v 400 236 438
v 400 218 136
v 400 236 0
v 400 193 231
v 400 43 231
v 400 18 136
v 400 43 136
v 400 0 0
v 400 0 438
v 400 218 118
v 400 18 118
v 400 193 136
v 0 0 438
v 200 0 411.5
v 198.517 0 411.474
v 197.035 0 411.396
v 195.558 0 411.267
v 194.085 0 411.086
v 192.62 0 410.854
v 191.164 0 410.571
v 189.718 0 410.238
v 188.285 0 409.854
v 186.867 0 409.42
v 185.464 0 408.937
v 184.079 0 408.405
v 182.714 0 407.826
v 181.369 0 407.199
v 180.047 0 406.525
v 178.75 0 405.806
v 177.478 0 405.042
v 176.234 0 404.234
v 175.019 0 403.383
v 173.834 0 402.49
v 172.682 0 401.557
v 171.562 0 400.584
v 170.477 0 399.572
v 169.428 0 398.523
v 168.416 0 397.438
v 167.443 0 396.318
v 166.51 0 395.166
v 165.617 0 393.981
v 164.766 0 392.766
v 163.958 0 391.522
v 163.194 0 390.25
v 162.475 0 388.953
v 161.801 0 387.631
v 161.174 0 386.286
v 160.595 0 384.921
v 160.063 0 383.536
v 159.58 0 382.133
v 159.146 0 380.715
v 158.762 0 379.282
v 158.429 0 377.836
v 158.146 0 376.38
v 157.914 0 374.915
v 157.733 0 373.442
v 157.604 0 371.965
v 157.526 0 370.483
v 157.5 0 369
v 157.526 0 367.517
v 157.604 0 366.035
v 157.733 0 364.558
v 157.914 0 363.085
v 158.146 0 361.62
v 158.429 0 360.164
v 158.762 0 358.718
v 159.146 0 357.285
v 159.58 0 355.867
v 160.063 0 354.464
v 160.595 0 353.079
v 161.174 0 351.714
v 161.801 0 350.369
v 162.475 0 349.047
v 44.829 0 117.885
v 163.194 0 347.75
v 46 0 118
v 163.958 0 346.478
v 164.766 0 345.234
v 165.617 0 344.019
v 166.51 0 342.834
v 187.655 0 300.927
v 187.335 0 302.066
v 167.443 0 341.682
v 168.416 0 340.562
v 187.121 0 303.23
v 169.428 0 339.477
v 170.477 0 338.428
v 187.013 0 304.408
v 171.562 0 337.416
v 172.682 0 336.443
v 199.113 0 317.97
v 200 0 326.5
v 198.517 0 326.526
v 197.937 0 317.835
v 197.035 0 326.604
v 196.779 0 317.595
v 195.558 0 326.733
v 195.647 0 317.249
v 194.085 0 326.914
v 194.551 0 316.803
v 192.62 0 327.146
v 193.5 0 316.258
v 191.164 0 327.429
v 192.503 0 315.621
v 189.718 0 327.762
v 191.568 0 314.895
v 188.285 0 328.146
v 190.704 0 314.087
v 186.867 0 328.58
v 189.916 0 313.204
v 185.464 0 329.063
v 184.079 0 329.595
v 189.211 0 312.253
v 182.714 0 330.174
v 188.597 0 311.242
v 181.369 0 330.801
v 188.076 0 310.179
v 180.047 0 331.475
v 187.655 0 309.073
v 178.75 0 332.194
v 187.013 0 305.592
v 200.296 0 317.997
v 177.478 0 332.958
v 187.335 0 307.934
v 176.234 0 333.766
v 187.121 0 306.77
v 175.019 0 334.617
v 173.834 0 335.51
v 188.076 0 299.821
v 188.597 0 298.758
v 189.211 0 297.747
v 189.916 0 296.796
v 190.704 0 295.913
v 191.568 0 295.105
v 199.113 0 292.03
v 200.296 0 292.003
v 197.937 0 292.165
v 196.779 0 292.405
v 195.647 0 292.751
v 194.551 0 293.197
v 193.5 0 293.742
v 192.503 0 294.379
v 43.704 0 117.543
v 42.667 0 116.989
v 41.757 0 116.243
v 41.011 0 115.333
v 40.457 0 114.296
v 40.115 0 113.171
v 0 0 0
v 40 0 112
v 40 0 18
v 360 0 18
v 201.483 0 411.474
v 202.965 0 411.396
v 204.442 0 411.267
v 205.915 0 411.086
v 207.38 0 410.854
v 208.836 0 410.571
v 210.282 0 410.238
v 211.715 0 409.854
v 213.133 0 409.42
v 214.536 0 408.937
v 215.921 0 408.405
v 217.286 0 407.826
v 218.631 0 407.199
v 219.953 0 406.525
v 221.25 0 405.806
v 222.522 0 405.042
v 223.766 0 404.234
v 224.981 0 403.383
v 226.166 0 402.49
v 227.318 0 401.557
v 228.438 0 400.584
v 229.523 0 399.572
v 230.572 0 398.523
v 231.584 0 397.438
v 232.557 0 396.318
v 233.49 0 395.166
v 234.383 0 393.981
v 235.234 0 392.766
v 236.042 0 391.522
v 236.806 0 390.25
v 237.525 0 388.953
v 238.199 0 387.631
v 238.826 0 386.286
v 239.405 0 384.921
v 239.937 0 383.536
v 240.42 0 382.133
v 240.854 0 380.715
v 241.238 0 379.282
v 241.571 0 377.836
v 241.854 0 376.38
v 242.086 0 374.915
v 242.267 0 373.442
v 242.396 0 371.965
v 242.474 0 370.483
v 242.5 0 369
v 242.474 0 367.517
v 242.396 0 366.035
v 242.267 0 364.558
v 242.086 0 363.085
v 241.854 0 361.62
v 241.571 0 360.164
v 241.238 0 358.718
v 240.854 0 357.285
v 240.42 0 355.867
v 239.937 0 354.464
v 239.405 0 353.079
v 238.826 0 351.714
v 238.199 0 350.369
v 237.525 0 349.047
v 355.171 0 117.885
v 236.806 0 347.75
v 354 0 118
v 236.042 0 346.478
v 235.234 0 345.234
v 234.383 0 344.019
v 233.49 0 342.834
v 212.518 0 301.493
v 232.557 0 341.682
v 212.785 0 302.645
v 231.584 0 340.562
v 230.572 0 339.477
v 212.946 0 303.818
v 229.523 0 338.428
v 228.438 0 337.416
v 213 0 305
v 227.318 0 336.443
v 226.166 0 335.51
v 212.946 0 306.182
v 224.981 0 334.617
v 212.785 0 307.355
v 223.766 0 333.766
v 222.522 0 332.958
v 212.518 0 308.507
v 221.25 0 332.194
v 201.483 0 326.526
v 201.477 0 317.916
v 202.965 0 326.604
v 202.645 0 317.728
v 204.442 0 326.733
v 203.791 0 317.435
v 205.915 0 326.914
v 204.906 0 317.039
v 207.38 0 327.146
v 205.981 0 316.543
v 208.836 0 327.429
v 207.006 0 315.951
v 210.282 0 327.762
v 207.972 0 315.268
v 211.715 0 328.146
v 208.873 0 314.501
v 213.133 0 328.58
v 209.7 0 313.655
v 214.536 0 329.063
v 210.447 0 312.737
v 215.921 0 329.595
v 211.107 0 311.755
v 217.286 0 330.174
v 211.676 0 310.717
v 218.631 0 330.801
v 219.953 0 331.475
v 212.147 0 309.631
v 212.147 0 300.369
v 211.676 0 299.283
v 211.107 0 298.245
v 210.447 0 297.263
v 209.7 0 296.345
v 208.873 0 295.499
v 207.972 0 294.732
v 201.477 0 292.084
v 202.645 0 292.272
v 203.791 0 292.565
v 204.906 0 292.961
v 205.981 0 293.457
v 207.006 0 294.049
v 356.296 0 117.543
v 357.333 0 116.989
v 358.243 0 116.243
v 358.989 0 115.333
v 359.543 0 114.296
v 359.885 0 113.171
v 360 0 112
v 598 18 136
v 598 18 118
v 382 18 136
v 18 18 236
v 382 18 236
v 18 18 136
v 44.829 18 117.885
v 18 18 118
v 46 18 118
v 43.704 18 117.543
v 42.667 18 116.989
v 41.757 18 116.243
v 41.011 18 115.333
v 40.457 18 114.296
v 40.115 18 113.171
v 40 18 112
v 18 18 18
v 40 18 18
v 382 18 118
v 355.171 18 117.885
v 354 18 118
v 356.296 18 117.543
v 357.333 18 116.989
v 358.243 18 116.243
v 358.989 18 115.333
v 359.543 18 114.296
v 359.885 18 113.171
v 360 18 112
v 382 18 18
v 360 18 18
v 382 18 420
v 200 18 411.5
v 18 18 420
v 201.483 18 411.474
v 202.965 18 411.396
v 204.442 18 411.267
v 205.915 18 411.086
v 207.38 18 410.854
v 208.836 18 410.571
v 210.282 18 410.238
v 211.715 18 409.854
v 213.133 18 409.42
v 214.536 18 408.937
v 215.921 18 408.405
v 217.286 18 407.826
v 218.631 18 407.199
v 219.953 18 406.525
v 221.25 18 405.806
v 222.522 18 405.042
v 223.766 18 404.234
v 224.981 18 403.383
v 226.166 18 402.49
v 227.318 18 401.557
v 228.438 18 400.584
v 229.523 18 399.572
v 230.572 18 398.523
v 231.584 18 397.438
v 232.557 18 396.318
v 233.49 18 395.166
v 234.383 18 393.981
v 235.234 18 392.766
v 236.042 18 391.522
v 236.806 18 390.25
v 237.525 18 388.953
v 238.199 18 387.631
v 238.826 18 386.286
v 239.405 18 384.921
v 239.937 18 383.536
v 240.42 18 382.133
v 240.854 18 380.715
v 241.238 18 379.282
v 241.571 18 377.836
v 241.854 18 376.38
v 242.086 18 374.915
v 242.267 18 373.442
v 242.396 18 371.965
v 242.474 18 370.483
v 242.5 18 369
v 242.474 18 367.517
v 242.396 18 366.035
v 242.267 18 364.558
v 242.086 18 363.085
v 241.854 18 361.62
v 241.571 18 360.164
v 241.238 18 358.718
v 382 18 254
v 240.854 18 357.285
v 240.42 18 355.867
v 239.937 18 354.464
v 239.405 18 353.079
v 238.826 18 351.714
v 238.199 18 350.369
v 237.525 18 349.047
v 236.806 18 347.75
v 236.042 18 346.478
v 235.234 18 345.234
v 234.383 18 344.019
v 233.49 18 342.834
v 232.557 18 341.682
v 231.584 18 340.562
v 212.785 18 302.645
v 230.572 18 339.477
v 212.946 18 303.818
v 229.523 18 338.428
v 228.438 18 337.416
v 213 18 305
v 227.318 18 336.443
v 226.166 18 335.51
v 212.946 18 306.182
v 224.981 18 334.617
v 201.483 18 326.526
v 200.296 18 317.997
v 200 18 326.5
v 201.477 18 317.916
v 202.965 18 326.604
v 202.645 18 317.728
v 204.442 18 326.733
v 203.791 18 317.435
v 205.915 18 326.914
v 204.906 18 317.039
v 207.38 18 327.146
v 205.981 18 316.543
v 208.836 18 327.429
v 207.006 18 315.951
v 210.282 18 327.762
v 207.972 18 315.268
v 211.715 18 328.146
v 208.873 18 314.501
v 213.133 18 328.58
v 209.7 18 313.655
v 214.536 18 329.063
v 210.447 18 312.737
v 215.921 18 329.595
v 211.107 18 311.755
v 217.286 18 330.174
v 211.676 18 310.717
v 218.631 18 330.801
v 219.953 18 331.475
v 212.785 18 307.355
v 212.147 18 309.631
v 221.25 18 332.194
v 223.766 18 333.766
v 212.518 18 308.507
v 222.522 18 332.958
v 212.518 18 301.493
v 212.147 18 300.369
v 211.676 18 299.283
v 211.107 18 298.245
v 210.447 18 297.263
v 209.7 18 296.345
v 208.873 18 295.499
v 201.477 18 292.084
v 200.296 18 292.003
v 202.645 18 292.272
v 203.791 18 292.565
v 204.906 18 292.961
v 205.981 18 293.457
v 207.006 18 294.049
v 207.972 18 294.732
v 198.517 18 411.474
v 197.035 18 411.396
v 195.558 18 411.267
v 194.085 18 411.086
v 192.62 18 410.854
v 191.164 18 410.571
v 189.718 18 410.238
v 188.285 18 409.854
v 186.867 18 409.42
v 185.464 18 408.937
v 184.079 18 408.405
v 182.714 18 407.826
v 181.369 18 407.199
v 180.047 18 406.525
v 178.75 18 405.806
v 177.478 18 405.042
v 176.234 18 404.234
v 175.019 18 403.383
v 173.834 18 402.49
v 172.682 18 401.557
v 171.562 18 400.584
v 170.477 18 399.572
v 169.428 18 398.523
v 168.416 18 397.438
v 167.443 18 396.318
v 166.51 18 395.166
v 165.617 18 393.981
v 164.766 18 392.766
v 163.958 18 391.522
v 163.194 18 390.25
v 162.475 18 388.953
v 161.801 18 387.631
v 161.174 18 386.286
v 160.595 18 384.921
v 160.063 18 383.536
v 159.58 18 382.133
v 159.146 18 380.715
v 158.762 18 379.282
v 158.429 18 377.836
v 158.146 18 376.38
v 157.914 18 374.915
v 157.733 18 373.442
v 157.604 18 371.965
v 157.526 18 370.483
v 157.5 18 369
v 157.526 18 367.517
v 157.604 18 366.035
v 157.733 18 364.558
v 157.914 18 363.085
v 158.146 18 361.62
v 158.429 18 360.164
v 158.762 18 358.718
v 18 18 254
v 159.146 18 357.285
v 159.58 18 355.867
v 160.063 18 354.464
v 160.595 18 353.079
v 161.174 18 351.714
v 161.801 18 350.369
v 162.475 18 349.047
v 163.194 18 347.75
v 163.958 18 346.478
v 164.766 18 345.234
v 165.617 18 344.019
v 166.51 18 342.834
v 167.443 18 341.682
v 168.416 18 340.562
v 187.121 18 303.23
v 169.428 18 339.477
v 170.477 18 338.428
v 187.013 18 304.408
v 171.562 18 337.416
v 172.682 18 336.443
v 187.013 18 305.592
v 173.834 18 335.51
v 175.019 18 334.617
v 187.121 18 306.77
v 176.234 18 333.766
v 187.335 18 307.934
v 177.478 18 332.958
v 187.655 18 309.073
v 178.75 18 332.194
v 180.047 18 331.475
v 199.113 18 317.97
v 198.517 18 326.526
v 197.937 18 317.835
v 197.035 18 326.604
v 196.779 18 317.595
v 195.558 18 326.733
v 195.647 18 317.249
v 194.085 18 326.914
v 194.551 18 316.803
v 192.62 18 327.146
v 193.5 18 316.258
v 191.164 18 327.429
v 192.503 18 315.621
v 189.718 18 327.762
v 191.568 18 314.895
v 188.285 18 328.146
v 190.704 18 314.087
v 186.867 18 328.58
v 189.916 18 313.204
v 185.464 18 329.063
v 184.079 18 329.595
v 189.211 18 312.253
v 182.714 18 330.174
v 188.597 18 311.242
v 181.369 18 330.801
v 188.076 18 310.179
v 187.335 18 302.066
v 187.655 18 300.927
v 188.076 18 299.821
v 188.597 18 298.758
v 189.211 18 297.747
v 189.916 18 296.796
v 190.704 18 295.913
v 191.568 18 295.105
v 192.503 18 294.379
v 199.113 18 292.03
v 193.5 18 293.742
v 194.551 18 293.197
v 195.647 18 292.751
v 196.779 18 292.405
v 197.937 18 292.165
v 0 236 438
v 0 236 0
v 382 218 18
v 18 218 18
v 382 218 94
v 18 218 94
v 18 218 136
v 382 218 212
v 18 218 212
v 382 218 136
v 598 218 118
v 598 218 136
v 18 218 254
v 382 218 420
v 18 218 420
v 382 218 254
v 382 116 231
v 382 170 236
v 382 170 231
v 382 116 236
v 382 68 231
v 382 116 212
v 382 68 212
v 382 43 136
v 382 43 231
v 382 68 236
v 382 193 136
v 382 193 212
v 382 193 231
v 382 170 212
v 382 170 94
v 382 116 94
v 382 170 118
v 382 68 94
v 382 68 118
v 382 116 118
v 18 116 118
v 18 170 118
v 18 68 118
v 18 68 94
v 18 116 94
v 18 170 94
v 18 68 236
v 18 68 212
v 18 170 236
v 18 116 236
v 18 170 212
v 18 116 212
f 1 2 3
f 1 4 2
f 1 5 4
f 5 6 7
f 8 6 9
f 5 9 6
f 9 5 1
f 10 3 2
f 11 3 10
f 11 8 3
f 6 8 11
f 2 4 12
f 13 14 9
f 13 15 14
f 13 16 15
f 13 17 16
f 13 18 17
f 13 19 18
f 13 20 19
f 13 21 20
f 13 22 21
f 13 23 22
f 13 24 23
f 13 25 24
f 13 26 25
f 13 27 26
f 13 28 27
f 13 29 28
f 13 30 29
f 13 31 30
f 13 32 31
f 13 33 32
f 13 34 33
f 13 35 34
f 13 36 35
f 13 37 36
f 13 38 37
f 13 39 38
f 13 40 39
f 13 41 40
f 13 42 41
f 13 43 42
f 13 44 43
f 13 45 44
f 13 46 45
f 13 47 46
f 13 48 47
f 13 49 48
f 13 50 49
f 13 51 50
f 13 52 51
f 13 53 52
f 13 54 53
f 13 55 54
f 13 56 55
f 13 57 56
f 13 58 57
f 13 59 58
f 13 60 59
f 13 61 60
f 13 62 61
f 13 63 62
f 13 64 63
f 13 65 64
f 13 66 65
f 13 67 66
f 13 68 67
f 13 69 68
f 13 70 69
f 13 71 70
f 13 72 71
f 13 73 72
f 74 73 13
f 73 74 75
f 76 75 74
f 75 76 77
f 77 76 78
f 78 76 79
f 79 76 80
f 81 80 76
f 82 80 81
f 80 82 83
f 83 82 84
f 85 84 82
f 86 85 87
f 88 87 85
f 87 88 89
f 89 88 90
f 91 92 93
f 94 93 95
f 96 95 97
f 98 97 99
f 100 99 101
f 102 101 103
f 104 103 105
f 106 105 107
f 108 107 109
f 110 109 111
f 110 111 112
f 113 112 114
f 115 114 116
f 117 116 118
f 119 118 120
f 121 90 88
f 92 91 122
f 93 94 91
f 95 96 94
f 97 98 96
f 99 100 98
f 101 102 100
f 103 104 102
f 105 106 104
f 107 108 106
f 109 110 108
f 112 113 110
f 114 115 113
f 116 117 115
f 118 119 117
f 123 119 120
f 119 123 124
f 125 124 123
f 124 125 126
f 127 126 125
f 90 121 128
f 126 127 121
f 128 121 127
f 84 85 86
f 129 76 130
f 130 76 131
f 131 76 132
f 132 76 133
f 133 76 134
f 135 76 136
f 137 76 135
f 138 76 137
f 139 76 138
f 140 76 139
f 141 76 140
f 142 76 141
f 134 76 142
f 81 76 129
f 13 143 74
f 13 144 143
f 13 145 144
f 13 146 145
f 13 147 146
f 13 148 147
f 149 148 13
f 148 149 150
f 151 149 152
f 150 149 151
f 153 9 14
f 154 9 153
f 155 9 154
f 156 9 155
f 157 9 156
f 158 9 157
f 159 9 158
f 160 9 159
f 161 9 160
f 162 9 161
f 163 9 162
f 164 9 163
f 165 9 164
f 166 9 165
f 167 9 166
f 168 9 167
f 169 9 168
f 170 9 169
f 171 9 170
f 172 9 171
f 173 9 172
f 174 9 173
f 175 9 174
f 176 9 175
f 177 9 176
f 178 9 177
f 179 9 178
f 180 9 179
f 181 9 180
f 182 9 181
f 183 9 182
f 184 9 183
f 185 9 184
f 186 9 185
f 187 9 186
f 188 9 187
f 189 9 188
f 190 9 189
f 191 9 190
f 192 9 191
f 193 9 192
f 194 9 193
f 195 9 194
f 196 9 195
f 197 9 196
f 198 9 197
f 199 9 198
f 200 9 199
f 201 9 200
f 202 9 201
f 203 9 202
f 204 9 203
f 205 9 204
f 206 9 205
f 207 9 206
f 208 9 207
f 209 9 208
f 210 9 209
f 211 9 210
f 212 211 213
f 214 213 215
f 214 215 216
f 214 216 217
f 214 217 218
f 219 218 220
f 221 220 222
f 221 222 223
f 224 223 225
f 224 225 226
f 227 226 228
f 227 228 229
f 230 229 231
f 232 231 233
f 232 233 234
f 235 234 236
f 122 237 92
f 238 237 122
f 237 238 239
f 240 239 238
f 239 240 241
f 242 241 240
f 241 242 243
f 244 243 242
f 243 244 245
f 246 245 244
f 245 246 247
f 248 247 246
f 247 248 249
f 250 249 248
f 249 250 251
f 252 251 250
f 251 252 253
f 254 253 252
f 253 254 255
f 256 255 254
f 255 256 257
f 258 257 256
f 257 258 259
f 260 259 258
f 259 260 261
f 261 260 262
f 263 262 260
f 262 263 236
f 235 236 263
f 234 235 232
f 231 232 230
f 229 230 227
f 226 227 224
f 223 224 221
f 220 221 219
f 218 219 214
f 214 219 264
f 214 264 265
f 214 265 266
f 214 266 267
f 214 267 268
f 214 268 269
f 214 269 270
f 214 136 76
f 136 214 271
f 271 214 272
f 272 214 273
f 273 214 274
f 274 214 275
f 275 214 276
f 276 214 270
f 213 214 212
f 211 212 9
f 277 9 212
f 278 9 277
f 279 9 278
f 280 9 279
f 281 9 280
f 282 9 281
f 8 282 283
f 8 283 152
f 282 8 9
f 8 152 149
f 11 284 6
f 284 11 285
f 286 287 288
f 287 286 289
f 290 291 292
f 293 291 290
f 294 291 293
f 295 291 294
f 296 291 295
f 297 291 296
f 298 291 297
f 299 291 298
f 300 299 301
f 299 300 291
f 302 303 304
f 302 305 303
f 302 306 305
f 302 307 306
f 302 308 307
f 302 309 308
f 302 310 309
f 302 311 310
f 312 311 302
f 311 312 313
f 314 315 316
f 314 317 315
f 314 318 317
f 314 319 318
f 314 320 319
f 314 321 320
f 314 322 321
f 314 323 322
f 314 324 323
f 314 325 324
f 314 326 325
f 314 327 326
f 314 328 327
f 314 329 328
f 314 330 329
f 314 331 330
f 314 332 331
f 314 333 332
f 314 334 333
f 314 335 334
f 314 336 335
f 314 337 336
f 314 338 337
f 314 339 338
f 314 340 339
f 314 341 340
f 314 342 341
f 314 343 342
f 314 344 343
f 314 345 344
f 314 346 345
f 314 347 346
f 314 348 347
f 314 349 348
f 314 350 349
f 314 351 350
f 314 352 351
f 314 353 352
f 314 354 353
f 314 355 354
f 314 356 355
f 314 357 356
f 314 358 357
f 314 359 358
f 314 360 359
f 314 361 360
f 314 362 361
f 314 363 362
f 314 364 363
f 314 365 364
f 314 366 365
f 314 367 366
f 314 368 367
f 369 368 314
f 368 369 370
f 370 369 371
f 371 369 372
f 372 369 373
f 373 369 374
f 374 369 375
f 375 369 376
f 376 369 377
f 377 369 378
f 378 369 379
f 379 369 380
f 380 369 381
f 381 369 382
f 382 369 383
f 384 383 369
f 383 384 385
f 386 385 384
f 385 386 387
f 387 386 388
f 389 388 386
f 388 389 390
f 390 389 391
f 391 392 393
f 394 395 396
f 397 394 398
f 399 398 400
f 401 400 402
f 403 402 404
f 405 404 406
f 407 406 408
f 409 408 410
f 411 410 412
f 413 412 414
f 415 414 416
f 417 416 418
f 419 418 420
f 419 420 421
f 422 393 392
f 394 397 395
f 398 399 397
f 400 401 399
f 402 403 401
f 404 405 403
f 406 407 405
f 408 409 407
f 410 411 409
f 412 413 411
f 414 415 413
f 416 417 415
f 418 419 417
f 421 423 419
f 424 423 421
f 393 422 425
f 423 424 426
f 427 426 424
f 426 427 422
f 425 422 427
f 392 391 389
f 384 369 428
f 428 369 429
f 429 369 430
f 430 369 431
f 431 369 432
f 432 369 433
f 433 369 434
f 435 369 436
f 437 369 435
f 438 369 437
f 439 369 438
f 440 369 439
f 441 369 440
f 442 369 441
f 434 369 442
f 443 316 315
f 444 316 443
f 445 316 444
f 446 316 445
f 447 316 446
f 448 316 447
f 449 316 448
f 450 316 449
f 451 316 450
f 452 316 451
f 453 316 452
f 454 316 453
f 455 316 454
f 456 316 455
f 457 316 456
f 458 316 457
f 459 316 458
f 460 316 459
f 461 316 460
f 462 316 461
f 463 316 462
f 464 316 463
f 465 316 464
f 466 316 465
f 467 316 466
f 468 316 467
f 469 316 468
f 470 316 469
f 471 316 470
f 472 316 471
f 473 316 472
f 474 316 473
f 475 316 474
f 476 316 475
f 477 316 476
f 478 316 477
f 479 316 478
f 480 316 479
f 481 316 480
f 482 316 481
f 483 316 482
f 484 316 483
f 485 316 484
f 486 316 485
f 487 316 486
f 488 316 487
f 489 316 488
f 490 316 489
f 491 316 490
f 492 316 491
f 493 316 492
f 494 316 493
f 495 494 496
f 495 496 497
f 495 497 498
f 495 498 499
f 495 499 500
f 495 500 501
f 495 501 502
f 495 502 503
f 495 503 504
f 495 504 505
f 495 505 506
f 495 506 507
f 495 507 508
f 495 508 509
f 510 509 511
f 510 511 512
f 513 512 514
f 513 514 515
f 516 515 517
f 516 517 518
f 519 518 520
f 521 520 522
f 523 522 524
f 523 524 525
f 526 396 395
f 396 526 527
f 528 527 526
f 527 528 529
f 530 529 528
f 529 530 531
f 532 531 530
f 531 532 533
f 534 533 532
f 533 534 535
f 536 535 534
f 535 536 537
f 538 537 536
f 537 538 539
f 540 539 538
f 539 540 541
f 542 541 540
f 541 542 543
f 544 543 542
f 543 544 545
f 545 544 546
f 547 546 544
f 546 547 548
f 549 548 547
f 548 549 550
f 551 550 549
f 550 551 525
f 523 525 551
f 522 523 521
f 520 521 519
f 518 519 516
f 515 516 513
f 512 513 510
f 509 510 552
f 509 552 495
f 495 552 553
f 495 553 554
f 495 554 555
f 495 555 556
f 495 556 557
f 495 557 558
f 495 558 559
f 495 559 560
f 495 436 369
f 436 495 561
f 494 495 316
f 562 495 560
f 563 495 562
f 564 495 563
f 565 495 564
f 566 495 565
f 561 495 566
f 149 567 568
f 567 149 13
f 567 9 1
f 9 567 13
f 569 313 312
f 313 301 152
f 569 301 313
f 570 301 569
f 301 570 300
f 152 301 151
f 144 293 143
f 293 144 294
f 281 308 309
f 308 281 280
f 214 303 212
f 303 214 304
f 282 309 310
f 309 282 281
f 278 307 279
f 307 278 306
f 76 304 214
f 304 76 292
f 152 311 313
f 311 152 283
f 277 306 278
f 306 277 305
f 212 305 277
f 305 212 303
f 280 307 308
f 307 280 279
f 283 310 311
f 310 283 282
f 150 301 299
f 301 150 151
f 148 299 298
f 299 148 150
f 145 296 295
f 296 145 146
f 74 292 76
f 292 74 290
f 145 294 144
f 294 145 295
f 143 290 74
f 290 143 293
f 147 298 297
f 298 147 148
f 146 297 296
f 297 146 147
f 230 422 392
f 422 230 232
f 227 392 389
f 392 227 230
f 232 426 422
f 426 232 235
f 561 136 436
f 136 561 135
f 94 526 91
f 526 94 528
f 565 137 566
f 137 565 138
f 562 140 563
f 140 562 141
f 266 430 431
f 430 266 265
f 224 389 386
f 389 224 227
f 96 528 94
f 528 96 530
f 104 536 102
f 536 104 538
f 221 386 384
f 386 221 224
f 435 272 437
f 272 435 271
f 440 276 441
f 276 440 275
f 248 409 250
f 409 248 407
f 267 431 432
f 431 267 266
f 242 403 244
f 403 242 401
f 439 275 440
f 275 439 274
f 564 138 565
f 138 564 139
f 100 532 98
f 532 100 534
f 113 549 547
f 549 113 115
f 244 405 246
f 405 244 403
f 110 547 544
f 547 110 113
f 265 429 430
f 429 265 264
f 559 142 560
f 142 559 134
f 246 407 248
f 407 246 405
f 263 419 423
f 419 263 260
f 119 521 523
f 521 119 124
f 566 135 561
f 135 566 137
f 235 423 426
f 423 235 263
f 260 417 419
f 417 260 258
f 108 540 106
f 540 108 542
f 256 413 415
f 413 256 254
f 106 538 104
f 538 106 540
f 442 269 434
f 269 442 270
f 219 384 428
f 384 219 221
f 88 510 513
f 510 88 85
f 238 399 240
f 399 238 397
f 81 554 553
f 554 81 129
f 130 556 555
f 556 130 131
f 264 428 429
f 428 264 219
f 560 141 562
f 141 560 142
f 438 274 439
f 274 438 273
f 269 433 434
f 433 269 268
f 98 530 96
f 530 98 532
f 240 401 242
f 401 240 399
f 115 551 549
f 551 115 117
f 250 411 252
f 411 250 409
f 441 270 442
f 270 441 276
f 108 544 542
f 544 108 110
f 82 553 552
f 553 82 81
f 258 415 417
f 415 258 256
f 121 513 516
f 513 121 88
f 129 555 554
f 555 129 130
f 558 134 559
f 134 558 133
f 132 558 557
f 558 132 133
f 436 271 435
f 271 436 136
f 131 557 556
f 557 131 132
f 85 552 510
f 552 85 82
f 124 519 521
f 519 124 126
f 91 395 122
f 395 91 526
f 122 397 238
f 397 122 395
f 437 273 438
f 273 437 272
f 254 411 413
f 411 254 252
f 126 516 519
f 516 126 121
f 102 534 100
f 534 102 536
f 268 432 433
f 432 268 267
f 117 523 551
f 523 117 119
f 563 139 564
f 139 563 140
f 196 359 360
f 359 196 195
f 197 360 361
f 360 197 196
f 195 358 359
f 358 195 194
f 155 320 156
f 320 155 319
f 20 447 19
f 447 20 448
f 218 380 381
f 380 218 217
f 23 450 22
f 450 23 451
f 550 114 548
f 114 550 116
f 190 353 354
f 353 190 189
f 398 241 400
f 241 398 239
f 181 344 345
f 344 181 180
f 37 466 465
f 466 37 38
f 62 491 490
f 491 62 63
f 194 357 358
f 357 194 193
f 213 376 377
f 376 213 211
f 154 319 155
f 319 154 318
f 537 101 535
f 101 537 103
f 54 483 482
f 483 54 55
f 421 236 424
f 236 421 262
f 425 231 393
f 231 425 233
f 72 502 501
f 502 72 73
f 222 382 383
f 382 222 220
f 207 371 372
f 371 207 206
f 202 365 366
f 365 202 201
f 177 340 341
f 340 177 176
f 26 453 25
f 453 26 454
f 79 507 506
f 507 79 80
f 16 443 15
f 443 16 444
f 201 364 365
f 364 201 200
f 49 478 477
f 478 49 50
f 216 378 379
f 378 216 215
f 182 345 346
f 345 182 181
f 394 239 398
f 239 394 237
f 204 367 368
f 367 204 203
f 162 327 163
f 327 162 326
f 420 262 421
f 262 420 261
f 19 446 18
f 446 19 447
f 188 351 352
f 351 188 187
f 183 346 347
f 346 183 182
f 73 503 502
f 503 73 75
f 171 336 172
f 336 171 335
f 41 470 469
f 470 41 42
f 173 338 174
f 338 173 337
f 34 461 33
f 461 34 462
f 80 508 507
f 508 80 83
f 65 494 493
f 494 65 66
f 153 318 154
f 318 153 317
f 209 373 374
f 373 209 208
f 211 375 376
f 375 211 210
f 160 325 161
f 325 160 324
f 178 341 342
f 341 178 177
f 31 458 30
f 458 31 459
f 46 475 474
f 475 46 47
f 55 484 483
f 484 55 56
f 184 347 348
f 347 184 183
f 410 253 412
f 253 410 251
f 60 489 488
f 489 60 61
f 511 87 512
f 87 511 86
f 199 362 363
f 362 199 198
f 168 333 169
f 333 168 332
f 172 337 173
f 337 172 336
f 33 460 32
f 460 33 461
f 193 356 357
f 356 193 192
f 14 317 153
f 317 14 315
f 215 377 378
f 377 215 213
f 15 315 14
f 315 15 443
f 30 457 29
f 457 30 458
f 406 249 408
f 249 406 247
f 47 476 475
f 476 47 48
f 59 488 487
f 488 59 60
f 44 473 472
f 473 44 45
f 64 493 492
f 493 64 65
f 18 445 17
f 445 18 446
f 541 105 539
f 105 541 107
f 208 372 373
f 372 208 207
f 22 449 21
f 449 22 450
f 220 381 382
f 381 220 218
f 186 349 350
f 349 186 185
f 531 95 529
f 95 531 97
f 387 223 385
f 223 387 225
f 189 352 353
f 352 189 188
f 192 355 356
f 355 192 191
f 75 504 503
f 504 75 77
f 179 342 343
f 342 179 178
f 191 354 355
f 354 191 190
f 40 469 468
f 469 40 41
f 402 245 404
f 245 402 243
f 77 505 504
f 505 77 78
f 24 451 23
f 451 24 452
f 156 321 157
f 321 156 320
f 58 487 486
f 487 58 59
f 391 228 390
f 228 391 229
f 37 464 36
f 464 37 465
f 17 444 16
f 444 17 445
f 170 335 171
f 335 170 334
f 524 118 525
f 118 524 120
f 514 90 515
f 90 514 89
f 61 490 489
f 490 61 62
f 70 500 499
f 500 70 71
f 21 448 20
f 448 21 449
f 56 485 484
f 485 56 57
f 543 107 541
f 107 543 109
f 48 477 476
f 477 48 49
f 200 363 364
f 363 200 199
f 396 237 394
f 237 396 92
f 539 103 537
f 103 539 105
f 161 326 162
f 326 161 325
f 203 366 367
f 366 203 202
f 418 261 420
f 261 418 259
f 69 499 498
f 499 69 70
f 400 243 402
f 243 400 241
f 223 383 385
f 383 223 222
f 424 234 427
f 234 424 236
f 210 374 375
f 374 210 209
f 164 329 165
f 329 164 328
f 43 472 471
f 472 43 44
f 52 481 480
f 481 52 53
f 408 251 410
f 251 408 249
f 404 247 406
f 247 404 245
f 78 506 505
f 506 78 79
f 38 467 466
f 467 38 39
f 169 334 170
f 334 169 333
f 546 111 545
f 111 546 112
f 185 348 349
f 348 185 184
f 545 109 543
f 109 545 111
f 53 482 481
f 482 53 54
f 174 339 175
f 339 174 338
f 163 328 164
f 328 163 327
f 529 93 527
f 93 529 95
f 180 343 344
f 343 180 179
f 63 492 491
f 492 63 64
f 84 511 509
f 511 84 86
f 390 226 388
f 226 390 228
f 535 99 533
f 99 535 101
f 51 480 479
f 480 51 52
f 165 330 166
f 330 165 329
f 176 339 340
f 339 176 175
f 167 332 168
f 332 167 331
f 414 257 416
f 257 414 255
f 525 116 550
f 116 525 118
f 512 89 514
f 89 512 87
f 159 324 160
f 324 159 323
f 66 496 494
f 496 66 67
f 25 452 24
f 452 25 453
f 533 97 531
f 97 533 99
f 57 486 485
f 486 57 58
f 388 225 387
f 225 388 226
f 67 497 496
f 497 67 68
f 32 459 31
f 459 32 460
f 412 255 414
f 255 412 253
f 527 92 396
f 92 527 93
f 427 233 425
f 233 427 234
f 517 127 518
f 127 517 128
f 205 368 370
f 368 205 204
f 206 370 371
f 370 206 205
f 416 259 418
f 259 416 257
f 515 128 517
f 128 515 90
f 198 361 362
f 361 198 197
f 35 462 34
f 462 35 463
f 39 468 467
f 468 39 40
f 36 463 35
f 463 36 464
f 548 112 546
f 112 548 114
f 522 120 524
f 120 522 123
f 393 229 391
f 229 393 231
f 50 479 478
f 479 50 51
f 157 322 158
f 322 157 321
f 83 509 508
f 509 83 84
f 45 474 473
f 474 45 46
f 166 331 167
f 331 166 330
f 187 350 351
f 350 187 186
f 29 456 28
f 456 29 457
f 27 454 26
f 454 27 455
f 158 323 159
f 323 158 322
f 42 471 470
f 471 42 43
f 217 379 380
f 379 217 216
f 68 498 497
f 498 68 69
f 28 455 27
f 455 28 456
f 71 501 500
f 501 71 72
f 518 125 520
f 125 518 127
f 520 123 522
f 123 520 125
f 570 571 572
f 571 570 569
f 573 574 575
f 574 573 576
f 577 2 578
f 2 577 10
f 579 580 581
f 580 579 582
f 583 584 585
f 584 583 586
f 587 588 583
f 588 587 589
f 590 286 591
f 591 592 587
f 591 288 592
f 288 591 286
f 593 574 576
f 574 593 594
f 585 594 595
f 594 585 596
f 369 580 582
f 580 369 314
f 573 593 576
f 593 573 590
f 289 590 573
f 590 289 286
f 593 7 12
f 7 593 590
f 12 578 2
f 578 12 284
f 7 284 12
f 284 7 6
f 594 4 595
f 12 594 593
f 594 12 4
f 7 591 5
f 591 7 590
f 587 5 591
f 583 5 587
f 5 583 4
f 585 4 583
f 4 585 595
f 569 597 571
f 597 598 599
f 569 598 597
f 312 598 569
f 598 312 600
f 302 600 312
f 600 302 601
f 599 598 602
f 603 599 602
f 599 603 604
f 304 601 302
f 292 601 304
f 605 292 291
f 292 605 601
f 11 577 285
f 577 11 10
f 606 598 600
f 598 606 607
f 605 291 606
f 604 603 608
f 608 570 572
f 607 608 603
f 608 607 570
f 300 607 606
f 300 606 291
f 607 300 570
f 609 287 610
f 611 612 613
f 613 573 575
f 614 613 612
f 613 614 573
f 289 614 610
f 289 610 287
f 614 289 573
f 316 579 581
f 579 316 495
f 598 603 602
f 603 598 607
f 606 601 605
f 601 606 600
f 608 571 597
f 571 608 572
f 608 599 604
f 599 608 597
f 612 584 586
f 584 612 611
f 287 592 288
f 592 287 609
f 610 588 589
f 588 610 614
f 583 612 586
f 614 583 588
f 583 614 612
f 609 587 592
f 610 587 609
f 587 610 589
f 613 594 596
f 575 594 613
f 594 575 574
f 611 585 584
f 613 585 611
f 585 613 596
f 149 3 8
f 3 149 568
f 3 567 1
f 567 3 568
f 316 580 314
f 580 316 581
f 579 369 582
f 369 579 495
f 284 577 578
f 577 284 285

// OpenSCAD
// Fotobox enclosure -- 400 x 236 x 438 mm carcass from 18 mm glued panel.
//
// Panel numbers follow the hand sketch:
//   1 front, 2 back (door), 3a upper right, 3b lower right, 4 left,
//   5 bottom, 6 top and the two shelves, plus 24 x 48 rails under the shelves.
//
// Construction: front (1) and back (2) are full size panels that cover the
// front and rear edges of both sides. The sides (3a/3b, 4) stand on the bottom
// (5), which carries the whole footprint. Top (6) and both shelves are inset
// boards between the sides. The right side is split into 3a and 3b, the gap
// between them is the slot the lower shelf -- the one the printer stands on --
// runs in. That shelf is long: it sticks out about 200 mm past the right side
// and carries the printer's paper cassette, and it can be pulled out completely
// for transport. The back is a door.
//
// The display is only partly let in: it is screwed onto the outside of the front
// panel, only the bulge on its back (320 x 110) passes through a notch that
// reaches down to the lower edge of the front panel. That notch, not a window,
// is the only opening for the display.
//
// Coordinates: x to the right, y to the back, z up, origin at the front left
// bottom corner. Every panel module is authored lying flat (x = length,
// y = width, z = thickness), so the same geometry serves the assembly and the
// cut list view.
//
// Views:
//   openscad fotobox_case.scad                            assembly
//   openscad -D 'part="exploded"' fotobox_case.scad       panels pulled apart
//   openscad -D 'part="cutlist"'  fotobox_case.scad       all boards laid flat
//   openscad -D 'part="front"' -o front.stl ...           one board
//
// The echo output on the console is the cut list plus the clearance checks.

/* [Render] */
part = "assembly";   // "assembly" | "exploded" | "cutlist" | "front" | "back" | "left" | "right_upper" | "right_lower" | "bottom" | "top" | "shelf" | "rail"
show_contents = true;    // ghost volumes of display, camera, printer, Pi
door_angle    = 0;       // back door, 0 = closed, up to 110
pullout       = 0;       // how far the printer shelf is pulled out to the right
explode_gap   = 130;     // used by part="exploded"

$fa = 2;
$fs = 1.2;
eps = 0.01;

/* [Material] */
t       = 18;   // panel thickness
rail_w  = 48;   // 24 x 48 rail, lying flat: 48 across, 24 high
rail_h  = 24;

/* [Carcass] */
width   = 400;  // outer width, front and back panel
inner_d = 200;  // depth of the side panels -> outer depth = inner_d + 2 * t
side_h  = 420;  // height of the side, front and back panels

/* [Front openings] */
// Notch for the bulge on the back of the display. It is open towards the lower
// edge of the front panel, so the display hangs as low as the panel allows.
bulge_w   = 320;
bulge_h   = 100;
bulge_d   = 25;   // how far the bulge stands off the display, incl. the panel
bulge_r   = 6;    // corner radius of the two upper corners, router bit
webcam_d  = 26;   // preview camera
webcam_z  = 305;  // axis over the floor
lens_d    = 85;   // main camera, clears the lens barrel
lens_z    = 369;  // optical axis over the floor, = shelf + riser + camera_axis
edge_min  = 12;   // smallest strip of wood left next to an opening

/* [Compartments] */
// The lower bay is exactly as high as the bulge, so the printer shelf clears it.
base_bay    = bulge_h;  // 3b, holds Pi, power supply and wiring
printer_bay = 100;      // clear height over the printer shelf
slot_play   = 0;        // extra height of the pull out slot, 1 mm gives the shelf air

/* [Printer shelf and window] */
shelf_over = 198;  // how far the shelf sticks out past the right side
pwin_len   = 150;  // window in 3a, along the box depth, sits centred
pwin_h     = 95;   // over the shelf; the window is open towards the slot

/* [Shelf rails] */
rail_y1 = 68;     // front rail, clear of the display body
rail_y2 = 170;    // back rail

/* [Contents, for the clearance check only] */
display   = [360, 40, 210];   // display outline in front of the panel, W x D x H
printer   = [133, 181, 68];   // Canon Selphy CP1500, D x W x H -- front faces right
cassette  = [95, 130, 35];    // paper cassette, sticks out through the window
camera    = [131, 80, 96];    // DSLR body, W x D x H
camera_riser = 60;            // plate, ball head or block, keeps the axis at lens_z
camera_axis  = 55;            // optical axis over the camera base
lens_len  = 90;
pi        = [127, 64, 49];    // printed Pi case, see ../pi4-fan-case

/* [Derived] */
depth     = inner_d + 2 * t;              // 236
inner_w   = width - 2 * t;                // 364
total_h   = side_h + t;                   // 438
slot_h    = t + slot_play;                // pull out slot in the right side
shelf_p_z = t + base_bay;                 // underside of the printer shelf, 128
shelf_c_z = shelf_p_z + slot_h + printer_bay;   // underside of the camera shelf, 266
shelf_p_l = inner_w + t + shelf_over;     // long printer shelf, 580
right_lo  = base_bay;                     // 3b, 110
right_up  = total_h - shelf_p_z - slot_h; // 3a, 292
top_z     = total_h - t;                  // 420
cam_bay   = top_z - (shelf_c_z + t);      // clear height over the camera shelf

// A feature at height Z sits at this local y on front, back and side panels,
// all of which start at z = t.
function fz(z) = z - t;

/* [Colours] */
c_fb    = [0.85, 0.72, 0.50];
c_side  = [0.78, 0.64, 0.44];
c_shelf = [0.90, 0.80, 0.60];
c_rail  = [0.62, 0.48, 0.32];

// ---------------------------------------------------------------- panels ---
// All authored lying flat: x = length, y = width, z = thickness.

module rrect(w, h, r) {
  hull() for (x = [r, w - r], y = [r, h - r]) translate([x, y]) circle(r);
}

// Rectangle with two rounded upper corners, open at the bottom edge.
module notch(w, h, r) {
  hull() {
    for (x = [r, w - r]) translate([x, h - r]) circle(r);
    translate([0, -1]) square([w, 1]);
  }
}

// 1 -- front: notch for the display bulge at the lower edge, two camera holes
module p_front() {
  difference() {
    cube([width, side_h, t]);
    translate([(width - bulge_w) / 2, 0, -eps])
      linear_extrude(t + 2 * eps) notch(bulge_w, bulge_h, bulge_r);
    translate([width / 2, fz(webcam_z), -eps]) cylinder(d = webcam_d, h = t + 2 * eps);
    translate([width / 2, fz(lens_z),   -eps]) cylinder(d = lens_d,   h = t + 2 * eps);
  }
}

// 2 -- back, same blank, hinged as a door
module p_back() {
  cube([width, side_h, t]);
}

// 4 -- left side
module p_left() {
  cube([inner_d, side_h, t]);
}

// 3a -- upper right side, notched for the printer window. The notch is open
// towards the slot underneath, so cassette and print pass through in one piece.
module p_right_upper() {
  difference() {
    cube([inner_d, right_up, t]);
    translate([(inner_d - pwin_len) / 2, -eps, -eps])
      cube([pwin_len, pwin_h + eps, t + 2 * eps]);
  }
}

// 3b -- lower right side
module p_right_lower() {
  cube([inner_d, right_lo, t]);
}

// 5 -- bottom, full footprint
module p_bottom() {
  cube([width, depth, t]);
}

// 6 -- top and camera shelf, identical inset boards
module p_shelf() {
  cube([inner_w, inner_d, t]);
}

// Printer shelf: runs through the slot in the right side and sticks out, the
// overhang carries the paper cassette.
module p_shelf_printer() {
  cube([shelf_p_l, inner_d, t]);
}

// 24 x 48 rail under a shelf, spans the full inner width
module p_rail() {
  cube([inner_w, rail_w, rail_h]);
}

// -------------------------------------------------------------- assembly ---

// Rotates a flat panel so that local x runs along global y and local y up.
module stand_up() {
  rotate([0, 0, 90]) rotate([90, 0, 0]) children();
}

module case_assembly(ex = 0, door = 0, pull = 0) {
  color(c_side) translate([0, 0, -ex]) p_bottom();                        // 5

  color(c_fb) translate([0, t - ex, t]) rotate([90, 0, 0]) p_front();     // 1

  color(c_fb)                                                             // 2
    translate([0, depth + ex, 0]) rotate([0, 0, door]) translate([0, -depth, 0])
      translate([0, depth, t]) rotate([90, 0, 0]) p_back();

  color(c_side) translate([-ex, t, t]) stand_up() p_left();               // 4

  color(c_side) translate([width - t + ex, t, t])                         // 3b
    stand_up() p_right_lower();

  color(c_side) translate([width - t + ex, t, shelf_p_z + slot_h])        // 3a
    stand_up() p_right_upper();

  color(c_shelf) translate([t, t, top_z + ex]) p_shelf();                 // 6 top
  color(c_shelf) translate([t, t, shelf_c_z]) p_shelf();                  // 6 camera shelf
  color(c_shelf) translate([t + pull + ex, t, shelf_p_z])                 // printer shelf
    p_shelf_printer();

  color(c_rail) for (z = [shelf_p_z - rail_h, shelf_c_z - rail_h])
    for (y = [rail_y1, rail_y2])
      translate([t, y, z]) p_rail();
}

// ------------------------------------------------------ contents, ghosts ---

module contents() {
  // display on the outside of the front panel, its bulge through the notch
  %translate([(width - display[0]) / 2, -display[1], t])
    cube([display[0], display[1], display[2]]);
  %translate([(width - bulge_w) / 2, 0, t]) cube([bulge_w, bulge_d, bulge_h]);

  // printer on the lower shelf, front towards the right side, cassette out
  // through the window and onto the overhang
  %translate([width - t - printer[0], (depth - printer[1]) / 2, shelf_p_z + t]) {
    cube(printer);
    translate([printer[0] - 10, (printer[1] - cassette[1]) / 2, 0])
      cube([cassette[0], cassette[1], cassette[2]]);
  }

  // camera on its riser, optical axis through the front hole
  %translate([(width - camera[0]) / 2, t + 92, shelf_c_z + t]) {
    translate([20, 0, 0]) cube([camera[0] - 40, camera[1], camera_riser]);
    translate([0, 0, camera_riser]) cube(camera);
    translate([camera[0] / 2, 0, camera_riser + camera_axis])
      rotate([90, 0, 0]) cylinder(d = lens_d - 8, h = lens_len);
  }

  // Pi case in the lower bay
  %translate([t + 30, t + 40, t]) cube(pi);
}

// ------------------------------------------------------------- cut list ---

module label(s) {
  color([0.2, 0.2, 0.2]) translate([0, -22, 0]) linear_extrude(1) text(s, size = 16);
}

module cutlist() {
  gap = 40;
  // row 1: front, back
  translate([0, 0, 0])                  { p_front(); label("1 vorn 400x420"); }
  translate([width + gap, 0, 0])        { p_back();  label("2 hinten (Tuer) 400x420"); }
  // row 2: sides
  y2 = side_h + 3 * gap;
  translate([0, y2, 0])                 { p_left();          label(str("4 links ", inner_d, "x", side_h)); }
  translate([inner_d + gap, y2, 0])     { p_right_upper();   label(str("3a re oben ", inner_d, "x", right_up)); }
  translate([2 * (inner_d + gap), y2, 0]) { p_right_lower(); label(str("3b re unten ", inner_d, "x", right_lo)); }
  // row 3: bottom, top, shelves, rails
  y3 = y2 + side_h + 3 * gap;
  translate([0, y3, 0])                 { p_bottom(); label(str("5 Boden ", depth, "x", width)); }
  translate([width + gap, y3, 0])       { p_shelf();  label(str("6 Deckel ", inner_d, "x", inner_w)); }
  y4 = y3 + max(depth, inner_d) + 3 * gap;
  translate([0, y4, 0])                 { p_shelf(); label(str("6 Fachboden Kamera ", inner_d, "x", inner_w)); }
  translate([inner_w + gap, y4, 0])     { p_shelf_printer(); label(str("Boden 2 Drucker ", inner_d, "x", shelf_p_l)); }
  y5 = y4 + inner_d + 3 * gap;
  for (i = [0 : 3])
    translate([0, y5 + i * (rail_w + gap / 2), 0]) p_rail();
  translate([0, y5, 0]) label(str("4x Leiste ", rail_h, "x", rail_w, "x", inner_w));
}

// ----------------------------------------------------------------- views ---

if (part == "assembly") {
  case_assembly(0, door_angle, pullout);
  if (show_contents) contents();
} else if (part == "exploded") {
  case_assembly(explode_gap, 25, explode_gap);
} else if (part == "cutlist") {
  cutlist();
} else if (part == "front")       p_front();
else if (part == "back")          p_back();
else if (part == "left")          p_left();
else if (part == "right_upper")   p_right_upper();
else if (part == "right_lower")   p_right_lower();
else if (part == "bottom")        p_bottom();
else if (part == "top" || part == "shelf") p_shelf();
else if (part == "shelf_printer") p_shelf_printer();
else if (part == "rail")          p_rail();
else assert(false, str("unknown part: ", part));

// ------------------------------------------------------------- cut list ---

echo(str("Aussenmass  ", width, " x ", depth, " x ", total_h));
echo(str("1+2  ", width, " x ", side_h, "   2x  vorn + hinten"));
echo(str("4    ", inner_d, " x ", side_h, "   1x  links"));
echo(str("3a   ", inner_d, " x ", right_up, "   1x  rechts oben"));
echo(str("3b   ", inner_d, " x ", right_lo, "   1x  rechts unten"));
echo(str("5    ", depth, " x ", width, "   1x  Boden"));
echo(str("6    ", inner_d, " x ", inner_w, "   2x  Deckel + Fachboden Kamera"));
echo(str("B2   ", inner_d, " x ", shelf_p_l, "   1x  Fachboden Drucker, ragt ",
         shelf_p_l - inner_w - t, " mm heraus"));
echo(str("L    ", rail_h, " x ", rail_w, " x ", inner_w, "   4x  Leisten"));

// ------------------------------------------------------- geometry checks ---

assert((width - bulge_w) / 2 >= edge_min,
       "not enough wood left beside the display notch");
assert(t + bulge_h <= shelf_p_z,
       "display bulge runs into the printer shelf -- raise base_bay");
assert(webcam_z - webcam_d / 2 >= shelf_c_z + t + 5,
       "preview camera hole sits behind the camera shelf");
assert(lens_z - lens_d / 2 >= webcam_z + webcam_d / 2 + 8,
       "the two camera holes collide");
assert(lens_z + lens_d / 2 <= total_h - edge_min,
       "main camera hole too close to the top edge");
assert(pwin_h <= right_up - edge_min && pwin_len <= inner_d - 2 * edge_min,
       "printer window leaves 3a too weak");

// Soft checks -- these only warn, the numbers come from the data sheets and
// are worth re-measuring on the actual parts.
if (inner_d < printer[1] + 8)
  echo(str("WARNUNG: Druckerfach nur ", inner_d,
           " mm tief, der Selphy braucht quer ", printer[1], " mm plus Luft."));
if (t + display[2] > webcam_z - webcam_d / 2)
  echo(str("WARNUNG: Display reicht bis ", t + display[2],
           " mm und verdeckt das Loch der Vorschaukamera bei ",
           webcam_z - webcam_d / 2));
if (pwin_len < cassette[1] + 16)
  echo(str("WARNUNG: Druckerfenster ", pwin_len, " mm, Kassette ist ", cassette[1]));
if (shelf_p_l - inner_w - t < cassette[0] + 20)
  echo(str("WARNUNG: Ueberstand ", shelf_p_l - inner_w - t,
           " mm traegt die Kassette (", cassette[0], " mm) nicht sicher"));
if (cam_bay < camera_riser + camera[2] + 5)
  echo(str("WARNUNG: Kamerafach ", cam_bay, " mm hoch, Kamera plus Podest brauchen ",
           camera_riser + camera[2]));
// The cassette sits in front of the printer, not on top of it -- only the
// printer body has to fit under the camera shelf.
if (printer_bay < printer[2] + 12)
  echo(str("WARNUNG: Druckerfach nur ", printer_bay, " mm hoch, Drucker ist ",
           printer[2]));
if (base_bay < pi[2] + 10)
  echo(str("WARNUNG: unteres Fach nur ", base_bay, " mm hoch"));
if (pwin_h < printer[2] + 5)
  echo(str("WARNUNG: Druckeroeffnung ", pwin_h, " mm hoch, Drucker ist ", printer[2]));
